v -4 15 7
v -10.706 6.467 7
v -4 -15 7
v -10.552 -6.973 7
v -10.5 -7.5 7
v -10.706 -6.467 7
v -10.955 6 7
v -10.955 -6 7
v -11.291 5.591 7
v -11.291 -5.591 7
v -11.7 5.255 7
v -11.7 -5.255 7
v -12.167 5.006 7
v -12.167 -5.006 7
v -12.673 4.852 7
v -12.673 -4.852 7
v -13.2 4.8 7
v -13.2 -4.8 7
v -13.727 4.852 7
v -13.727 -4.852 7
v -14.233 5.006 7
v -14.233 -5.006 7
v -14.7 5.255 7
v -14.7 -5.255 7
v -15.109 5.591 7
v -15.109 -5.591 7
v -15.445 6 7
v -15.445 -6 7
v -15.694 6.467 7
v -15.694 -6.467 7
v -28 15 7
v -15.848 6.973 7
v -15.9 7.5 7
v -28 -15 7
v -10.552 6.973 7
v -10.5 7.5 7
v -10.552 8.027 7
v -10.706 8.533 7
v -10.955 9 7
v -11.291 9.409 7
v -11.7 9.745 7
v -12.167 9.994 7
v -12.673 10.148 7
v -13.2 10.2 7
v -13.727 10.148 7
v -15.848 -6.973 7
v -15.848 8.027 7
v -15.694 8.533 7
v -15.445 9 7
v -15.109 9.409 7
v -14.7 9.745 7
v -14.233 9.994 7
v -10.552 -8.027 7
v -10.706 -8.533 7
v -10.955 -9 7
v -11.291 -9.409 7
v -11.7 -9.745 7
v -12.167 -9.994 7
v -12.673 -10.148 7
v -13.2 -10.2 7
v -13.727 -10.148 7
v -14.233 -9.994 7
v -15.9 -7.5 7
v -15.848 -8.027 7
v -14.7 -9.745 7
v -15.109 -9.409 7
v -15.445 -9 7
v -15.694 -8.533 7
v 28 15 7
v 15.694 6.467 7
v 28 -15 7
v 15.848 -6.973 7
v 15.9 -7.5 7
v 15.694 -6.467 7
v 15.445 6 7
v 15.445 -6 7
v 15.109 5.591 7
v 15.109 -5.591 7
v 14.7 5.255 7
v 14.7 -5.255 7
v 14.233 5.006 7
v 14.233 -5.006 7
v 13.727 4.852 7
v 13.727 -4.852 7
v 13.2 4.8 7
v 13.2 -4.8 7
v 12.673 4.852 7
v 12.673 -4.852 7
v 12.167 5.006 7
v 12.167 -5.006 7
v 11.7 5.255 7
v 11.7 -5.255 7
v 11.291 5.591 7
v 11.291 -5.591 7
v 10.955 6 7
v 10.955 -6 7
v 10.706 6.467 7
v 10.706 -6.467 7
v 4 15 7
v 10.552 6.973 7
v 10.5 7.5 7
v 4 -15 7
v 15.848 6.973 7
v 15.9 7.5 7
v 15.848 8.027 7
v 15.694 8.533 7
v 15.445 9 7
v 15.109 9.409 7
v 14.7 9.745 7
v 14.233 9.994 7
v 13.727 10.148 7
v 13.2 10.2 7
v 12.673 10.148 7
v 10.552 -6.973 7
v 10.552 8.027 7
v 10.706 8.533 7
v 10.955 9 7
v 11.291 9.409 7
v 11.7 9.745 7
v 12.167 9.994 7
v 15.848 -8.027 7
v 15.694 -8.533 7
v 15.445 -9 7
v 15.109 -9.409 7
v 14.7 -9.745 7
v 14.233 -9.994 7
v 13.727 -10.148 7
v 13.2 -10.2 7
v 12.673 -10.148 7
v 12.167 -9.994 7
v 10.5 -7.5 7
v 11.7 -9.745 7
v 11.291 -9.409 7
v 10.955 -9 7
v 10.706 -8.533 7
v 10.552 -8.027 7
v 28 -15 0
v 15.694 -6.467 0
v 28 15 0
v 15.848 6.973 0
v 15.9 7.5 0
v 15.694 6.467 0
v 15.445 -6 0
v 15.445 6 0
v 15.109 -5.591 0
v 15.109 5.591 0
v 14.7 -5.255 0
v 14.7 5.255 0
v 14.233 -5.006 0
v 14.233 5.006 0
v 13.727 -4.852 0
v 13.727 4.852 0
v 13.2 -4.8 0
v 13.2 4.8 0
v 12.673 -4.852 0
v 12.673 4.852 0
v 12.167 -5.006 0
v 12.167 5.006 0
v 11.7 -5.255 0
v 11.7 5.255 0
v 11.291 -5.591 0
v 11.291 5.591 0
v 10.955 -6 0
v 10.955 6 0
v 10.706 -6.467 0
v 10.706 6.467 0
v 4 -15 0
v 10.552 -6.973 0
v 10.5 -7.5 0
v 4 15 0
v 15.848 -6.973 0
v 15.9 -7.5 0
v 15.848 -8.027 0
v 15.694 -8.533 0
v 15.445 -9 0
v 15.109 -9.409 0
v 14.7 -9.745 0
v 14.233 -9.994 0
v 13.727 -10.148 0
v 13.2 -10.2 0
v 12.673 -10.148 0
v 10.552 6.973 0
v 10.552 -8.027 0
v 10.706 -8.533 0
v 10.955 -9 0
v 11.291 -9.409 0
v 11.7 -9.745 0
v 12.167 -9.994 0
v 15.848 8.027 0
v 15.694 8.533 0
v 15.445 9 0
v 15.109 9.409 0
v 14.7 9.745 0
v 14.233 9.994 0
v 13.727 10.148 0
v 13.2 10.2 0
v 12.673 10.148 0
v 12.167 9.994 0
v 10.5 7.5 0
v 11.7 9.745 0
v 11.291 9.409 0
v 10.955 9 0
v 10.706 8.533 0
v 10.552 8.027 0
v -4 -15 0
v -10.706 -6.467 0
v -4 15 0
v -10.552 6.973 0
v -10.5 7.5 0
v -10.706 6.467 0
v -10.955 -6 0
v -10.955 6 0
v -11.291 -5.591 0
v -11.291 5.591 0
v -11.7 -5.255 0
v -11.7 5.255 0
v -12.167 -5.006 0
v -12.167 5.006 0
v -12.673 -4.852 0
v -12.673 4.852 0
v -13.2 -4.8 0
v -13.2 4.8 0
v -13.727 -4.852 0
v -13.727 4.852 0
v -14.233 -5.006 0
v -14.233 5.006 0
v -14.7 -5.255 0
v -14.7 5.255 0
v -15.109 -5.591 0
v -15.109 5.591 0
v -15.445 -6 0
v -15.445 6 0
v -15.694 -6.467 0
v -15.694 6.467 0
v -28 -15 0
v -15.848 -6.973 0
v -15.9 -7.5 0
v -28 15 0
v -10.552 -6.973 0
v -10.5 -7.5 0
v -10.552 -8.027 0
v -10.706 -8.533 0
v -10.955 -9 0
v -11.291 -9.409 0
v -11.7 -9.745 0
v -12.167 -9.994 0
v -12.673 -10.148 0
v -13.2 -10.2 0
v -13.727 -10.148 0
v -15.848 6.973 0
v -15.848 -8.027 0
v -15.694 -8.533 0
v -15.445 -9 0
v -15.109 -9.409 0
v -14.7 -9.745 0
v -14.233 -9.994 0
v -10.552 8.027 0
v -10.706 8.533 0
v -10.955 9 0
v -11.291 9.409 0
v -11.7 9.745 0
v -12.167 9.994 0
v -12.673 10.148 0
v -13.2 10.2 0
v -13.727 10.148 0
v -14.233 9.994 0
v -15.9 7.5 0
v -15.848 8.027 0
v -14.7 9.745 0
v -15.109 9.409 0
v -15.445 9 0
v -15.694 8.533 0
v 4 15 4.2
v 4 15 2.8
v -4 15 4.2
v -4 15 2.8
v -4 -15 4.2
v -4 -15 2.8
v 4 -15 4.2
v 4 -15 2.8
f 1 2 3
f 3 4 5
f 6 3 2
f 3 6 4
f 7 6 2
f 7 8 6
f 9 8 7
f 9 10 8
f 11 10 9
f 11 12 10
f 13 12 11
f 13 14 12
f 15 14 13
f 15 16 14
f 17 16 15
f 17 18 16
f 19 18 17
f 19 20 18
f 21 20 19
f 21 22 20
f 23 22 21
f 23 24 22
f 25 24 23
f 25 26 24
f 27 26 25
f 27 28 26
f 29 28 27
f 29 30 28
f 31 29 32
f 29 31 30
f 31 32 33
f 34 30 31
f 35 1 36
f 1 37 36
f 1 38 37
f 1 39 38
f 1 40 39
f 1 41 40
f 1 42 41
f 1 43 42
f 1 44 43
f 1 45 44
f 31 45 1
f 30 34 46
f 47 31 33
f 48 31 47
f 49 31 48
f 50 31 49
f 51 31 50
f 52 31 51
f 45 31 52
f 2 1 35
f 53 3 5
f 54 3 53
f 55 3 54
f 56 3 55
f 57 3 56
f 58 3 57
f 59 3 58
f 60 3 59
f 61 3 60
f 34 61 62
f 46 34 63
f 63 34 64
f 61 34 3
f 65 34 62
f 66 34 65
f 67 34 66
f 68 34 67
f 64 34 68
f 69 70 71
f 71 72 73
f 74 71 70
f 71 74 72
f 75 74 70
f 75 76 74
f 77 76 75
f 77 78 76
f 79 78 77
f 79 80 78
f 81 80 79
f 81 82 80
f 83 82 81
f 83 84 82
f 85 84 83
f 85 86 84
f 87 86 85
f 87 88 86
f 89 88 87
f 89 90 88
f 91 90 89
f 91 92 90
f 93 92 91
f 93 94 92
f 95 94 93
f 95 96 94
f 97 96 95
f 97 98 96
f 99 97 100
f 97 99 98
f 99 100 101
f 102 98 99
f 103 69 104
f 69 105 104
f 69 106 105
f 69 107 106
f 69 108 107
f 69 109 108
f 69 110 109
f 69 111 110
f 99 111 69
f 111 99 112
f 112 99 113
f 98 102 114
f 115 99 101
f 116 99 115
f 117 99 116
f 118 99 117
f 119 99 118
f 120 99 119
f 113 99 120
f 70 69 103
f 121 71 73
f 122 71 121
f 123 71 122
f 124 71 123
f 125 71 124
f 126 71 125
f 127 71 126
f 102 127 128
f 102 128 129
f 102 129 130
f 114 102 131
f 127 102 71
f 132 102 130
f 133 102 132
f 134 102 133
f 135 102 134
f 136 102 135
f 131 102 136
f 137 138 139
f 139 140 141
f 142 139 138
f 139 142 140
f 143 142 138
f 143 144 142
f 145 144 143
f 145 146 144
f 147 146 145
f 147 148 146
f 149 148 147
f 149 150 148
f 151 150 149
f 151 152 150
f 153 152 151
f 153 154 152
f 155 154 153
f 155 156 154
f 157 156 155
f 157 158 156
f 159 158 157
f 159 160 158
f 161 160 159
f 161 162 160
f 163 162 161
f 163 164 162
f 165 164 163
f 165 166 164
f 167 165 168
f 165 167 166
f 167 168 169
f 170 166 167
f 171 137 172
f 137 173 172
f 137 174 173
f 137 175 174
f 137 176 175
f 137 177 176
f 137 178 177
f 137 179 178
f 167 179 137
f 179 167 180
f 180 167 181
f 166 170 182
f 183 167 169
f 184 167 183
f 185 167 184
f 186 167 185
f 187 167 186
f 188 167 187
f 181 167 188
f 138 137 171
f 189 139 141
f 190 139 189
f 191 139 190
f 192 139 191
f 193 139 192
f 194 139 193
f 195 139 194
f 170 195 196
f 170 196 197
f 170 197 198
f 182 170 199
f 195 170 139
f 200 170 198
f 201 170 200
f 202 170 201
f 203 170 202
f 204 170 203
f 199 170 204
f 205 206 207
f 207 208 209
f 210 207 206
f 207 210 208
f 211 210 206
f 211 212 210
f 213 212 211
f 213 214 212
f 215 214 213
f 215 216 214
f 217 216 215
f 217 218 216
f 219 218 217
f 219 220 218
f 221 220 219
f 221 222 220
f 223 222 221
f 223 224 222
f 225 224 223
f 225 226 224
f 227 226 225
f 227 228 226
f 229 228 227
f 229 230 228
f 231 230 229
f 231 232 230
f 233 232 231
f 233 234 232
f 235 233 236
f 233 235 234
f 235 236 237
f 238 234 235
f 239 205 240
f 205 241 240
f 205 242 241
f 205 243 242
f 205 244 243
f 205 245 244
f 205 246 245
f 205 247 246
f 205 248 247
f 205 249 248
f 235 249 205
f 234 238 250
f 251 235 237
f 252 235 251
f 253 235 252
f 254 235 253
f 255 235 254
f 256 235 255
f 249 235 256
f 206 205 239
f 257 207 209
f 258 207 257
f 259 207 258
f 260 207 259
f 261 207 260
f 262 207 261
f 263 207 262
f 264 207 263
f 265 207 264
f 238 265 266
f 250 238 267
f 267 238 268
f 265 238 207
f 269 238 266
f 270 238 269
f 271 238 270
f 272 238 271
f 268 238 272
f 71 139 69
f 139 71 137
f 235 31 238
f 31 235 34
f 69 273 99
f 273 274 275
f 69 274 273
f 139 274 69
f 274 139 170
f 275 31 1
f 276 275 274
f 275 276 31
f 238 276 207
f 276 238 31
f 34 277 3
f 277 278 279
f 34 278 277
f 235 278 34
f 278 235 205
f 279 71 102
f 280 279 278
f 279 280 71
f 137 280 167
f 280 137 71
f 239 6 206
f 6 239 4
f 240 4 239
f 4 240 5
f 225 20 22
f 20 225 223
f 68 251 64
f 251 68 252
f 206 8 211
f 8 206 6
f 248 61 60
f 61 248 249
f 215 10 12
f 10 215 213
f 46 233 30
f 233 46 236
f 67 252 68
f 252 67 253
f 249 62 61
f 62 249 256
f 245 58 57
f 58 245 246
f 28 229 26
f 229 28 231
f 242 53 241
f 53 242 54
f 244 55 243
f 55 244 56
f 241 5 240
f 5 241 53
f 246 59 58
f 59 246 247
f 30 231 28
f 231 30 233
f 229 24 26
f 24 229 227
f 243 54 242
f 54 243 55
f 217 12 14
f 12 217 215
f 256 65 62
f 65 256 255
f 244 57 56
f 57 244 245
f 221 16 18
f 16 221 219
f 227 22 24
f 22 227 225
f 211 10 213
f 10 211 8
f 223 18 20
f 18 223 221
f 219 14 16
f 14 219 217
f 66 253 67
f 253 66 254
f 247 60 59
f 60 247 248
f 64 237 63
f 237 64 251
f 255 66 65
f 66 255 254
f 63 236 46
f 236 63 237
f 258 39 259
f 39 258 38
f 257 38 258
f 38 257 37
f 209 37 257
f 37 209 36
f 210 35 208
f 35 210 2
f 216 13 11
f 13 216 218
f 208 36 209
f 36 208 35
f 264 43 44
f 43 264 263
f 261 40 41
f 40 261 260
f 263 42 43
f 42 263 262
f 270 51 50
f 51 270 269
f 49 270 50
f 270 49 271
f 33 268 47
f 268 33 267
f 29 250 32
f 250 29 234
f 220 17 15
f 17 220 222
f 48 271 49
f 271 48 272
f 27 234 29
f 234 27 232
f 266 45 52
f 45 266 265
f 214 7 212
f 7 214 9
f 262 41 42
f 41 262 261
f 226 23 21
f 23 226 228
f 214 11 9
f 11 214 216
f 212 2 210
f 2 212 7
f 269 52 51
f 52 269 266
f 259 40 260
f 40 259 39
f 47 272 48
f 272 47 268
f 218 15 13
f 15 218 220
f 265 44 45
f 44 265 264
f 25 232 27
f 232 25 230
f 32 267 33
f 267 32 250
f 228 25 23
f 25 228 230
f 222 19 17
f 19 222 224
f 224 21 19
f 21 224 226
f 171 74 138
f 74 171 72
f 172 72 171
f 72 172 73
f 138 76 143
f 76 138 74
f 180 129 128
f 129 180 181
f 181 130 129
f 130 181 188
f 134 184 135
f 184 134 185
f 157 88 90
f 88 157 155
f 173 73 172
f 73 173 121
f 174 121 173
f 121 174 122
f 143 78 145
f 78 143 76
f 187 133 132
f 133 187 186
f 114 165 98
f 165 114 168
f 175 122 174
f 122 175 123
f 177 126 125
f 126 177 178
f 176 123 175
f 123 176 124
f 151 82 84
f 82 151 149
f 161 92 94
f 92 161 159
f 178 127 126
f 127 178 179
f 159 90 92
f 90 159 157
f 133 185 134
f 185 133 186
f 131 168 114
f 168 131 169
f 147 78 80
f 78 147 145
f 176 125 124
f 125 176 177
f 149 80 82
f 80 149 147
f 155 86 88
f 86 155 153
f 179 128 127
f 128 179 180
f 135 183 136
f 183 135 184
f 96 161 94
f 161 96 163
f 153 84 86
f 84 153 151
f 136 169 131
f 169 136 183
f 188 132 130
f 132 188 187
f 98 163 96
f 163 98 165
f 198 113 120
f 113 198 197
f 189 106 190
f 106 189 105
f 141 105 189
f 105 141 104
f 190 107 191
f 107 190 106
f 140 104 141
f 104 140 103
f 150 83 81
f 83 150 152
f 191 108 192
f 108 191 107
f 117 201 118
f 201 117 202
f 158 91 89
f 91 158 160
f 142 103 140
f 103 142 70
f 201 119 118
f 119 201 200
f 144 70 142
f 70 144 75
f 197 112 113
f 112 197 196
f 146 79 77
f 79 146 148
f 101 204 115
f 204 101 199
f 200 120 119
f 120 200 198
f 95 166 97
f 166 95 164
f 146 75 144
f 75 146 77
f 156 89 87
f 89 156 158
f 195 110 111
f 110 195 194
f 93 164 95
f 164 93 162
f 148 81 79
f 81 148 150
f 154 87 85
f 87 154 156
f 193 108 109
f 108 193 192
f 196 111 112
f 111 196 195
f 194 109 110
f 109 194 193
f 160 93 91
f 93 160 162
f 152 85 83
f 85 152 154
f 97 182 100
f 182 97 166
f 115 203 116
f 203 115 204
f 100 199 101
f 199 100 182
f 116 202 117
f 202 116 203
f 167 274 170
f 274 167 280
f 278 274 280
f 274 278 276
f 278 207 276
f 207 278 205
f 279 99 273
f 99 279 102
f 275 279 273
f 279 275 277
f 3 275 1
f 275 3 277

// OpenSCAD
$fn = 32;

// ----------------------------------------------------------------------
// Living hinge: 56 x 30 mm plates, 1.4 mm flexible web
// ----------------------------------------------------------------------

// --- parameters (mm) ---
plate_len = 24;           // plate length outside the web
plate_w = 30;             // plate width
thick = 7;                // plate thickness
web_half = 4;             // half width of the flex band
web_t = 1.4;              // flexible web thickness
web_z = 2.8;              // web position inside the thickness
boss_d = 11;              // screw boss diameter
boss_h = 7;               // screw boss height
boss_x = 13.2;            // screw boss distance from the web
screw_d = 5.4;            // screw hole

difference() {
  union() {
    /* one flat strip, later thinned at the middle */
    translate([-28, -15, 0]) cube([56, 30, 7]);
    /* screw bosses, sunk 0.5 mm into the plates */
    for (sx = [-13.2, 13.2]) {
      for (sy = [-7.5, 7.5]) {
        translate([sx, sy, 0]) cylinder(h = boss_h, d = boss_d);
      }
    }
  }
  /* channel from below: leaves the web on top of it */
  translate([-4, -17.5, -2.5]) cube([8, 35, 5.3]);
  /* channel from above: thins the web down to web_t */
  translate([-4, -17.5, 4.2]) cube([8, 35, 5.3]);
  /* screw holes through the bosses */
  for (sx = [-13.2, 13.2]) {
    for (sy = [-7.5, 7.5]) {
      translate([sx, sy, -2.5]) cylinder(h = boss_h + 5, d = screw_d);
    }
  }
}
